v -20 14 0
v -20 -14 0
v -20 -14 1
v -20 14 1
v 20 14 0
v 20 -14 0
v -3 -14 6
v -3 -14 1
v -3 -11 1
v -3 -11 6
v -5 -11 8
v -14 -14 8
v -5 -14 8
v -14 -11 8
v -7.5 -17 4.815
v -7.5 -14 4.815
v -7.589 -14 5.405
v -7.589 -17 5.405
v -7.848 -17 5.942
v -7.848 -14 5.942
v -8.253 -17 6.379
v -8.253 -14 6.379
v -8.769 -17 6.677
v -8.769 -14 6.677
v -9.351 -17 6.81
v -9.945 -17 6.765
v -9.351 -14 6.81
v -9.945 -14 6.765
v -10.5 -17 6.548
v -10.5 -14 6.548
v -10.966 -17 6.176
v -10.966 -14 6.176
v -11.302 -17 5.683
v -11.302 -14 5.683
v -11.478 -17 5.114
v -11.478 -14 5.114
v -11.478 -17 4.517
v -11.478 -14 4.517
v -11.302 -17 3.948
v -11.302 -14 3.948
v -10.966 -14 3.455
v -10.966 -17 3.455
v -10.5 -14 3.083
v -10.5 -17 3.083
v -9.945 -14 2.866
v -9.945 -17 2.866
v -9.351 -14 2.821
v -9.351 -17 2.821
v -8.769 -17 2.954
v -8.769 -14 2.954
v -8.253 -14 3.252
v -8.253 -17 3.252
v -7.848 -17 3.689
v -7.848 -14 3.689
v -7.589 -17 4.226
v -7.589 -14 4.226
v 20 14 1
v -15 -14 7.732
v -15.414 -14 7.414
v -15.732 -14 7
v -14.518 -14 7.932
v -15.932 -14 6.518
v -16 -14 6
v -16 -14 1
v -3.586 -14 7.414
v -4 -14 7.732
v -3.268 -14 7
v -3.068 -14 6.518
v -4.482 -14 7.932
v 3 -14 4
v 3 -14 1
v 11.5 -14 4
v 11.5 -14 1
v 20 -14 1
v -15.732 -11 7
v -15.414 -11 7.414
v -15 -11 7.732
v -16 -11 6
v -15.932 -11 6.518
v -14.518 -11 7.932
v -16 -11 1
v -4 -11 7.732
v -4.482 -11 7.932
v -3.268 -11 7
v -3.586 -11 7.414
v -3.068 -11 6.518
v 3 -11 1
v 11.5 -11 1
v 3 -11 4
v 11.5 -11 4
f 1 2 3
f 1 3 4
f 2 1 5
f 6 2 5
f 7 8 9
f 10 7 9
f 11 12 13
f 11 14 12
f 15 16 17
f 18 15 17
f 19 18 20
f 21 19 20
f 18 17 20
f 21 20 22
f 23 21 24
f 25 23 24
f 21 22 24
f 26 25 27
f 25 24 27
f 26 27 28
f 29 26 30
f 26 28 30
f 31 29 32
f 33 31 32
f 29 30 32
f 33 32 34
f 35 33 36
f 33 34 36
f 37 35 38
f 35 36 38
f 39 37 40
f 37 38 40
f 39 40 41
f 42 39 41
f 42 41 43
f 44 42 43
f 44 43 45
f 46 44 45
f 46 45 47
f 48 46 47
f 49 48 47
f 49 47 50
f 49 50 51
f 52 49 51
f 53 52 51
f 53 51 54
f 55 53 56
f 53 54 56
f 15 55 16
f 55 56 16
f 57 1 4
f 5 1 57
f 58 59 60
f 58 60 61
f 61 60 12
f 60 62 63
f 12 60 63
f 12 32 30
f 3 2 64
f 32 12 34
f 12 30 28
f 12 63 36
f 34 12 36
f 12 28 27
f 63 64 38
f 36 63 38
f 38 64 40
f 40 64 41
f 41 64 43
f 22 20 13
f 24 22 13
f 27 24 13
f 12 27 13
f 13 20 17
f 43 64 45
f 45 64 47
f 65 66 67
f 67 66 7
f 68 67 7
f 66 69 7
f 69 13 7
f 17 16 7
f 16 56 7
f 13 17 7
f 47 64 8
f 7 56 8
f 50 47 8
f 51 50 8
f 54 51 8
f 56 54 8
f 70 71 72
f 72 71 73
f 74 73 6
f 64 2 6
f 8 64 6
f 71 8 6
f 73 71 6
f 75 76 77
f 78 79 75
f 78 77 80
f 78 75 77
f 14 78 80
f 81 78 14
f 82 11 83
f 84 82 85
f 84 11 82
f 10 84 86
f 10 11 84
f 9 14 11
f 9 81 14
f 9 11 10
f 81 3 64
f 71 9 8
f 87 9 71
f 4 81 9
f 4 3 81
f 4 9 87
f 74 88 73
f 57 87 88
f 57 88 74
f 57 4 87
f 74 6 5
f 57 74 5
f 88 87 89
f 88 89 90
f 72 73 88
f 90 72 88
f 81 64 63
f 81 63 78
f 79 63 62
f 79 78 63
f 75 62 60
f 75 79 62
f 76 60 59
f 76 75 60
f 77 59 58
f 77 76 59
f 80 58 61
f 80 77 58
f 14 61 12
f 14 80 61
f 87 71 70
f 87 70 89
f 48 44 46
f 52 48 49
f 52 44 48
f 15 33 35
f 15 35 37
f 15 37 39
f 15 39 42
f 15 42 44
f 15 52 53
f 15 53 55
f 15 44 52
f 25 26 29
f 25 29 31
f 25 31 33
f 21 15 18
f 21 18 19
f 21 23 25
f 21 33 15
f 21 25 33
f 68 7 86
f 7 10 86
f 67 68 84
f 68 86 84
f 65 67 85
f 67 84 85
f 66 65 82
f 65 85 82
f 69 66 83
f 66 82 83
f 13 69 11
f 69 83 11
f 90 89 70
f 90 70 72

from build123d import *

# Parameters (mm, degrees)
F0_W     = 40
F0_H     = 28
F1_DEPTH = 1
F2_W     = 13
F2_H     = 3
F3_DEPTH = 7
F4_R     = 2
F2_W_2   = 8.5
F5_DEPTH = 3
F6_R     = 2
F7_DEPTH = 3


with BuildPart() as f1:
    # F0 (on Top) → F1 (new body)
    with BuildSketch(Plane.XY):
        Rectangle(F0_W, F0_H)
    extrude(amount=F1_DEPTH)

    # F2 (on face) → F3 (join)
    with BuildSketch(Plane.XY.offset(1)):
        with Locations((-9.5, -12.5)):
            Rectangle(F2_W, F2_H)
    extrude(amount=F3_DEPTH)

    # F4
    f4_edges = [f1.edges().sort_by_distance(p)[0] for p in [
        (-16, -12.5, 8),
        (-3, -12.5, 8),
    ]]
    fillet(f4_edges, radius=F4_R)

    # F2 (on face) → F5 (join)
    with BuildSketch(Plane.XY.offset(1)):
        with Locations((7.25, -12.5)):
            Rectangle(F2_W_2, F2_H)
    extrude(amount=F5_DEPTH)

    # F6 (on face) → F7 (join)
    with BuildSketch(Plane.XZ.offset(14)):
        with Locations((-9.5, 4.815496)):
            Circle(F6_R)
    extrude(amount=F7_DEPTH)


solid = f1.part
